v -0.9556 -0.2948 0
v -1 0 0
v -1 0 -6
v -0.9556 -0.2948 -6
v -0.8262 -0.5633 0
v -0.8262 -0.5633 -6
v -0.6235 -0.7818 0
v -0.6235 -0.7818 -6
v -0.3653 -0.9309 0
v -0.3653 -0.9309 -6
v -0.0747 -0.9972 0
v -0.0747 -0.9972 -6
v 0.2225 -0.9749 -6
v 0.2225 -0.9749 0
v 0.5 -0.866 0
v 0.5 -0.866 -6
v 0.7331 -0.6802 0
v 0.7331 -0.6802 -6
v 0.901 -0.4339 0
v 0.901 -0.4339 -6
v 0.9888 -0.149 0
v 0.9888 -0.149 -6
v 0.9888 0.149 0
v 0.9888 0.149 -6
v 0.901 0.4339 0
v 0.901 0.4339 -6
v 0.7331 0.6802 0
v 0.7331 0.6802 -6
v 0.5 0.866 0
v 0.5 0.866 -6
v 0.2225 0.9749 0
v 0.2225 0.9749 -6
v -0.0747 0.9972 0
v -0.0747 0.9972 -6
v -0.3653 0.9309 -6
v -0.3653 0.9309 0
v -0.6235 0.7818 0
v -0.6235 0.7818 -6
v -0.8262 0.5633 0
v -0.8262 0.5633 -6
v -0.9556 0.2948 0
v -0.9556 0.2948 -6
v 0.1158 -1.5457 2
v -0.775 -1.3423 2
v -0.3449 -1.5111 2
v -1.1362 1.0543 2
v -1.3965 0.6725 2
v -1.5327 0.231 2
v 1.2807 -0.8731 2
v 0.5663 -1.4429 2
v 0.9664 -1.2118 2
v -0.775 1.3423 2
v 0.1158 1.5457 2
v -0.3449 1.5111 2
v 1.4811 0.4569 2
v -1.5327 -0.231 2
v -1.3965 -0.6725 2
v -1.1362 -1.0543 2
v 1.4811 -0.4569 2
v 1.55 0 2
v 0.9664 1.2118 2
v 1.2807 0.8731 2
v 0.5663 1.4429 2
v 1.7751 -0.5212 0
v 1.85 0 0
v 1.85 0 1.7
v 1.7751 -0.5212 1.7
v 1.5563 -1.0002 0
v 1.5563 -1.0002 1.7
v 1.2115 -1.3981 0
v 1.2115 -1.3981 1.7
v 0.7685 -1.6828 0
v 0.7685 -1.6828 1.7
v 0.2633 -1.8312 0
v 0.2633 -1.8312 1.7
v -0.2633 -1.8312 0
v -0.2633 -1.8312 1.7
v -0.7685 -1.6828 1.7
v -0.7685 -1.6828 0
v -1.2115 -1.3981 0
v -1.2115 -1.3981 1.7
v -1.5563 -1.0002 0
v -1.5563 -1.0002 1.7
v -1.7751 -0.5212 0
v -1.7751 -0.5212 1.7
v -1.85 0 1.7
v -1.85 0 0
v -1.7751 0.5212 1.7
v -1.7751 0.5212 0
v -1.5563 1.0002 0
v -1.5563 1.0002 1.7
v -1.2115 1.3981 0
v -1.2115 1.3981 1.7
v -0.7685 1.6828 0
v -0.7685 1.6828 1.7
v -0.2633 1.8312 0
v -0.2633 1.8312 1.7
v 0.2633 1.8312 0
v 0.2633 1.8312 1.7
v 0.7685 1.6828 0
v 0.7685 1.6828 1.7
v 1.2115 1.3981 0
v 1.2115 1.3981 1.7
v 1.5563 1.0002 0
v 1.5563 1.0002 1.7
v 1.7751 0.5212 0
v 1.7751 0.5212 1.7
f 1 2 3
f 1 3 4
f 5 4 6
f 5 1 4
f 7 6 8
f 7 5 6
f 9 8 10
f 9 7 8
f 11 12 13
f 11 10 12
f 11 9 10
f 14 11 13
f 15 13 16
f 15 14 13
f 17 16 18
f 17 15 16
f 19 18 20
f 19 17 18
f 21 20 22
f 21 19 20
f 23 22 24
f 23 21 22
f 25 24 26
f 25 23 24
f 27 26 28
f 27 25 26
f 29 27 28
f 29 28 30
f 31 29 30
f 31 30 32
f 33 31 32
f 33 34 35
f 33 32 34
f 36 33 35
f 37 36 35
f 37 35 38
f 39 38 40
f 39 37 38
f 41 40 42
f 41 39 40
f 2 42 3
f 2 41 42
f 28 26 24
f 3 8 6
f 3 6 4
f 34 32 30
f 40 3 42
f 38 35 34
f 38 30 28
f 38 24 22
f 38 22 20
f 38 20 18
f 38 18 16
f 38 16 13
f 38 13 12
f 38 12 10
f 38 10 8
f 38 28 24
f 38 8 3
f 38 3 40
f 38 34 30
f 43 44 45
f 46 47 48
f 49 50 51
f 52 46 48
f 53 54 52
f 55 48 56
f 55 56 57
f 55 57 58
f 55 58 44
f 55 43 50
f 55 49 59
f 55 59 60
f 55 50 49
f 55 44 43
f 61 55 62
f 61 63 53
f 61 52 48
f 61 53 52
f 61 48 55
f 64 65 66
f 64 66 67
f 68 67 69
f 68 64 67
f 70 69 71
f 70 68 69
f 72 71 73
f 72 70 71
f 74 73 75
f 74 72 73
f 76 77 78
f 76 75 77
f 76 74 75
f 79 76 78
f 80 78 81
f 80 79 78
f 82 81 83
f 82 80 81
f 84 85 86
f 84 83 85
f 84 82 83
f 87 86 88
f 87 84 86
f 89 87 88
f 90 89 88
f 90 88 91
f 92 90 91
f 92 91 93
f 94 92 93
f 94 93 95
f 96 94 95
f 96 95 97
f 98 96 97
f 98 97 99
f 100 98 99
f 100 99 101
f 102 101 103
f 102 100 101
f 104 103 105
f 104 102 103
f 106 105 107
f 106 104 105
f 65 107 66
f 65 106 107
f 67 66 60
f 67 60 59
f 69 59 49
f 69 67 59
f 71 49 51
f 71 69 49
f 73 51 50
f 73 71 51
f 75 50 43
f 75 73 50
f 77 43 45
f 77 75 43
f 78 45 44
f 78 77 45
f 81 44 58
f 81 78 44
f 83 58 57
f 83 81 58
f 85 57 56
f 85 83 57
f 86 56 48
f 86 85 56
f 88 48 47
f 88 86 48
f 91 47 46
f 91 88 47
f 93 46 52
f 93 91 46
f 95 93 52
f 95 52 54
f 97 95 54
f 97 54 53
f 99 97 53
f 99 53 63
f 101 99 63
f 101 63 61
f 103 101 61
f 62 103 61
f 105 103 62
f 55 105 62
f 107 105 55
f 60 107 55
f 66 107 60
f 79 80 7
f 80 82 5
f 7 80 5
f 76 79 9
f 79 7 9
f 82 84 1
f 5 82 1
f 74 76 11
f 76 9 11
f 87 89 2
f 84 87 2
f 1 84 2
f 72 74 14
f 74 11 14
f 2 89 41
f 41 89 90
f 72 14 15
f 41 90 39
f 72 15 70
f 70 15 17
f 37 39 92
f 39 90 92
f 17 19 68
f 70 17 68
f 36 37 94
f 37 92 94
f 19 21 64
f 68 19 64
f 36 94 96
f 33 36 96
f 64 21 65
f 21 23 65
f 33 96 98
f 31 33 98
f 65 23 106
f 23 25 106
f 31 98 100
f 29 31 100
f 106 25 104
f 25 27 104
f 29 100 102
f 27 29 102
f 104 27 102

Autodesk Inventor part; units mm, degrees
ref_plane "YZ Plane" through (0, 0, 0) normal (1, 0, 0) x (0, 1, 0)
ref_plane "XZ Plane" through (0, 0, 0) normal (0, 1, 0) x (-1, 0, 0)
ref_plane "XY Plane" through (0, 0, 0) normal (0, 0, 1) x (1, 0, 0)
sketch "スケッチ1" plane through (0, 0, 0) normal (0, 0, 1) x (1, 0, 0)
  circle A0 centre (0, 0) radius 1.85
  dimension "d0" = 3.7
extrude "押し出し1" add sketch "スケッチ1" along normal blind 2
sketch "スケッチ2" plane through (0, 0, 0) normal (0, 0, -1) x (-1, 0, 0)
  circle A0 centre (0, 0) radius 1
  dimension "d3" = 2
extrude "押し出し2" add sketch "スケッチ2" along normal blind 6
thread "ねじ1" size "M2x0.4" class "6g" standard "ANSI Metric M Profile" full length
chamfer "面取り1" distance 0.3 angle 45 1 edges at (-1.85, 0, 2)
properties part number "M2×6" material "ステンレス鋼"
